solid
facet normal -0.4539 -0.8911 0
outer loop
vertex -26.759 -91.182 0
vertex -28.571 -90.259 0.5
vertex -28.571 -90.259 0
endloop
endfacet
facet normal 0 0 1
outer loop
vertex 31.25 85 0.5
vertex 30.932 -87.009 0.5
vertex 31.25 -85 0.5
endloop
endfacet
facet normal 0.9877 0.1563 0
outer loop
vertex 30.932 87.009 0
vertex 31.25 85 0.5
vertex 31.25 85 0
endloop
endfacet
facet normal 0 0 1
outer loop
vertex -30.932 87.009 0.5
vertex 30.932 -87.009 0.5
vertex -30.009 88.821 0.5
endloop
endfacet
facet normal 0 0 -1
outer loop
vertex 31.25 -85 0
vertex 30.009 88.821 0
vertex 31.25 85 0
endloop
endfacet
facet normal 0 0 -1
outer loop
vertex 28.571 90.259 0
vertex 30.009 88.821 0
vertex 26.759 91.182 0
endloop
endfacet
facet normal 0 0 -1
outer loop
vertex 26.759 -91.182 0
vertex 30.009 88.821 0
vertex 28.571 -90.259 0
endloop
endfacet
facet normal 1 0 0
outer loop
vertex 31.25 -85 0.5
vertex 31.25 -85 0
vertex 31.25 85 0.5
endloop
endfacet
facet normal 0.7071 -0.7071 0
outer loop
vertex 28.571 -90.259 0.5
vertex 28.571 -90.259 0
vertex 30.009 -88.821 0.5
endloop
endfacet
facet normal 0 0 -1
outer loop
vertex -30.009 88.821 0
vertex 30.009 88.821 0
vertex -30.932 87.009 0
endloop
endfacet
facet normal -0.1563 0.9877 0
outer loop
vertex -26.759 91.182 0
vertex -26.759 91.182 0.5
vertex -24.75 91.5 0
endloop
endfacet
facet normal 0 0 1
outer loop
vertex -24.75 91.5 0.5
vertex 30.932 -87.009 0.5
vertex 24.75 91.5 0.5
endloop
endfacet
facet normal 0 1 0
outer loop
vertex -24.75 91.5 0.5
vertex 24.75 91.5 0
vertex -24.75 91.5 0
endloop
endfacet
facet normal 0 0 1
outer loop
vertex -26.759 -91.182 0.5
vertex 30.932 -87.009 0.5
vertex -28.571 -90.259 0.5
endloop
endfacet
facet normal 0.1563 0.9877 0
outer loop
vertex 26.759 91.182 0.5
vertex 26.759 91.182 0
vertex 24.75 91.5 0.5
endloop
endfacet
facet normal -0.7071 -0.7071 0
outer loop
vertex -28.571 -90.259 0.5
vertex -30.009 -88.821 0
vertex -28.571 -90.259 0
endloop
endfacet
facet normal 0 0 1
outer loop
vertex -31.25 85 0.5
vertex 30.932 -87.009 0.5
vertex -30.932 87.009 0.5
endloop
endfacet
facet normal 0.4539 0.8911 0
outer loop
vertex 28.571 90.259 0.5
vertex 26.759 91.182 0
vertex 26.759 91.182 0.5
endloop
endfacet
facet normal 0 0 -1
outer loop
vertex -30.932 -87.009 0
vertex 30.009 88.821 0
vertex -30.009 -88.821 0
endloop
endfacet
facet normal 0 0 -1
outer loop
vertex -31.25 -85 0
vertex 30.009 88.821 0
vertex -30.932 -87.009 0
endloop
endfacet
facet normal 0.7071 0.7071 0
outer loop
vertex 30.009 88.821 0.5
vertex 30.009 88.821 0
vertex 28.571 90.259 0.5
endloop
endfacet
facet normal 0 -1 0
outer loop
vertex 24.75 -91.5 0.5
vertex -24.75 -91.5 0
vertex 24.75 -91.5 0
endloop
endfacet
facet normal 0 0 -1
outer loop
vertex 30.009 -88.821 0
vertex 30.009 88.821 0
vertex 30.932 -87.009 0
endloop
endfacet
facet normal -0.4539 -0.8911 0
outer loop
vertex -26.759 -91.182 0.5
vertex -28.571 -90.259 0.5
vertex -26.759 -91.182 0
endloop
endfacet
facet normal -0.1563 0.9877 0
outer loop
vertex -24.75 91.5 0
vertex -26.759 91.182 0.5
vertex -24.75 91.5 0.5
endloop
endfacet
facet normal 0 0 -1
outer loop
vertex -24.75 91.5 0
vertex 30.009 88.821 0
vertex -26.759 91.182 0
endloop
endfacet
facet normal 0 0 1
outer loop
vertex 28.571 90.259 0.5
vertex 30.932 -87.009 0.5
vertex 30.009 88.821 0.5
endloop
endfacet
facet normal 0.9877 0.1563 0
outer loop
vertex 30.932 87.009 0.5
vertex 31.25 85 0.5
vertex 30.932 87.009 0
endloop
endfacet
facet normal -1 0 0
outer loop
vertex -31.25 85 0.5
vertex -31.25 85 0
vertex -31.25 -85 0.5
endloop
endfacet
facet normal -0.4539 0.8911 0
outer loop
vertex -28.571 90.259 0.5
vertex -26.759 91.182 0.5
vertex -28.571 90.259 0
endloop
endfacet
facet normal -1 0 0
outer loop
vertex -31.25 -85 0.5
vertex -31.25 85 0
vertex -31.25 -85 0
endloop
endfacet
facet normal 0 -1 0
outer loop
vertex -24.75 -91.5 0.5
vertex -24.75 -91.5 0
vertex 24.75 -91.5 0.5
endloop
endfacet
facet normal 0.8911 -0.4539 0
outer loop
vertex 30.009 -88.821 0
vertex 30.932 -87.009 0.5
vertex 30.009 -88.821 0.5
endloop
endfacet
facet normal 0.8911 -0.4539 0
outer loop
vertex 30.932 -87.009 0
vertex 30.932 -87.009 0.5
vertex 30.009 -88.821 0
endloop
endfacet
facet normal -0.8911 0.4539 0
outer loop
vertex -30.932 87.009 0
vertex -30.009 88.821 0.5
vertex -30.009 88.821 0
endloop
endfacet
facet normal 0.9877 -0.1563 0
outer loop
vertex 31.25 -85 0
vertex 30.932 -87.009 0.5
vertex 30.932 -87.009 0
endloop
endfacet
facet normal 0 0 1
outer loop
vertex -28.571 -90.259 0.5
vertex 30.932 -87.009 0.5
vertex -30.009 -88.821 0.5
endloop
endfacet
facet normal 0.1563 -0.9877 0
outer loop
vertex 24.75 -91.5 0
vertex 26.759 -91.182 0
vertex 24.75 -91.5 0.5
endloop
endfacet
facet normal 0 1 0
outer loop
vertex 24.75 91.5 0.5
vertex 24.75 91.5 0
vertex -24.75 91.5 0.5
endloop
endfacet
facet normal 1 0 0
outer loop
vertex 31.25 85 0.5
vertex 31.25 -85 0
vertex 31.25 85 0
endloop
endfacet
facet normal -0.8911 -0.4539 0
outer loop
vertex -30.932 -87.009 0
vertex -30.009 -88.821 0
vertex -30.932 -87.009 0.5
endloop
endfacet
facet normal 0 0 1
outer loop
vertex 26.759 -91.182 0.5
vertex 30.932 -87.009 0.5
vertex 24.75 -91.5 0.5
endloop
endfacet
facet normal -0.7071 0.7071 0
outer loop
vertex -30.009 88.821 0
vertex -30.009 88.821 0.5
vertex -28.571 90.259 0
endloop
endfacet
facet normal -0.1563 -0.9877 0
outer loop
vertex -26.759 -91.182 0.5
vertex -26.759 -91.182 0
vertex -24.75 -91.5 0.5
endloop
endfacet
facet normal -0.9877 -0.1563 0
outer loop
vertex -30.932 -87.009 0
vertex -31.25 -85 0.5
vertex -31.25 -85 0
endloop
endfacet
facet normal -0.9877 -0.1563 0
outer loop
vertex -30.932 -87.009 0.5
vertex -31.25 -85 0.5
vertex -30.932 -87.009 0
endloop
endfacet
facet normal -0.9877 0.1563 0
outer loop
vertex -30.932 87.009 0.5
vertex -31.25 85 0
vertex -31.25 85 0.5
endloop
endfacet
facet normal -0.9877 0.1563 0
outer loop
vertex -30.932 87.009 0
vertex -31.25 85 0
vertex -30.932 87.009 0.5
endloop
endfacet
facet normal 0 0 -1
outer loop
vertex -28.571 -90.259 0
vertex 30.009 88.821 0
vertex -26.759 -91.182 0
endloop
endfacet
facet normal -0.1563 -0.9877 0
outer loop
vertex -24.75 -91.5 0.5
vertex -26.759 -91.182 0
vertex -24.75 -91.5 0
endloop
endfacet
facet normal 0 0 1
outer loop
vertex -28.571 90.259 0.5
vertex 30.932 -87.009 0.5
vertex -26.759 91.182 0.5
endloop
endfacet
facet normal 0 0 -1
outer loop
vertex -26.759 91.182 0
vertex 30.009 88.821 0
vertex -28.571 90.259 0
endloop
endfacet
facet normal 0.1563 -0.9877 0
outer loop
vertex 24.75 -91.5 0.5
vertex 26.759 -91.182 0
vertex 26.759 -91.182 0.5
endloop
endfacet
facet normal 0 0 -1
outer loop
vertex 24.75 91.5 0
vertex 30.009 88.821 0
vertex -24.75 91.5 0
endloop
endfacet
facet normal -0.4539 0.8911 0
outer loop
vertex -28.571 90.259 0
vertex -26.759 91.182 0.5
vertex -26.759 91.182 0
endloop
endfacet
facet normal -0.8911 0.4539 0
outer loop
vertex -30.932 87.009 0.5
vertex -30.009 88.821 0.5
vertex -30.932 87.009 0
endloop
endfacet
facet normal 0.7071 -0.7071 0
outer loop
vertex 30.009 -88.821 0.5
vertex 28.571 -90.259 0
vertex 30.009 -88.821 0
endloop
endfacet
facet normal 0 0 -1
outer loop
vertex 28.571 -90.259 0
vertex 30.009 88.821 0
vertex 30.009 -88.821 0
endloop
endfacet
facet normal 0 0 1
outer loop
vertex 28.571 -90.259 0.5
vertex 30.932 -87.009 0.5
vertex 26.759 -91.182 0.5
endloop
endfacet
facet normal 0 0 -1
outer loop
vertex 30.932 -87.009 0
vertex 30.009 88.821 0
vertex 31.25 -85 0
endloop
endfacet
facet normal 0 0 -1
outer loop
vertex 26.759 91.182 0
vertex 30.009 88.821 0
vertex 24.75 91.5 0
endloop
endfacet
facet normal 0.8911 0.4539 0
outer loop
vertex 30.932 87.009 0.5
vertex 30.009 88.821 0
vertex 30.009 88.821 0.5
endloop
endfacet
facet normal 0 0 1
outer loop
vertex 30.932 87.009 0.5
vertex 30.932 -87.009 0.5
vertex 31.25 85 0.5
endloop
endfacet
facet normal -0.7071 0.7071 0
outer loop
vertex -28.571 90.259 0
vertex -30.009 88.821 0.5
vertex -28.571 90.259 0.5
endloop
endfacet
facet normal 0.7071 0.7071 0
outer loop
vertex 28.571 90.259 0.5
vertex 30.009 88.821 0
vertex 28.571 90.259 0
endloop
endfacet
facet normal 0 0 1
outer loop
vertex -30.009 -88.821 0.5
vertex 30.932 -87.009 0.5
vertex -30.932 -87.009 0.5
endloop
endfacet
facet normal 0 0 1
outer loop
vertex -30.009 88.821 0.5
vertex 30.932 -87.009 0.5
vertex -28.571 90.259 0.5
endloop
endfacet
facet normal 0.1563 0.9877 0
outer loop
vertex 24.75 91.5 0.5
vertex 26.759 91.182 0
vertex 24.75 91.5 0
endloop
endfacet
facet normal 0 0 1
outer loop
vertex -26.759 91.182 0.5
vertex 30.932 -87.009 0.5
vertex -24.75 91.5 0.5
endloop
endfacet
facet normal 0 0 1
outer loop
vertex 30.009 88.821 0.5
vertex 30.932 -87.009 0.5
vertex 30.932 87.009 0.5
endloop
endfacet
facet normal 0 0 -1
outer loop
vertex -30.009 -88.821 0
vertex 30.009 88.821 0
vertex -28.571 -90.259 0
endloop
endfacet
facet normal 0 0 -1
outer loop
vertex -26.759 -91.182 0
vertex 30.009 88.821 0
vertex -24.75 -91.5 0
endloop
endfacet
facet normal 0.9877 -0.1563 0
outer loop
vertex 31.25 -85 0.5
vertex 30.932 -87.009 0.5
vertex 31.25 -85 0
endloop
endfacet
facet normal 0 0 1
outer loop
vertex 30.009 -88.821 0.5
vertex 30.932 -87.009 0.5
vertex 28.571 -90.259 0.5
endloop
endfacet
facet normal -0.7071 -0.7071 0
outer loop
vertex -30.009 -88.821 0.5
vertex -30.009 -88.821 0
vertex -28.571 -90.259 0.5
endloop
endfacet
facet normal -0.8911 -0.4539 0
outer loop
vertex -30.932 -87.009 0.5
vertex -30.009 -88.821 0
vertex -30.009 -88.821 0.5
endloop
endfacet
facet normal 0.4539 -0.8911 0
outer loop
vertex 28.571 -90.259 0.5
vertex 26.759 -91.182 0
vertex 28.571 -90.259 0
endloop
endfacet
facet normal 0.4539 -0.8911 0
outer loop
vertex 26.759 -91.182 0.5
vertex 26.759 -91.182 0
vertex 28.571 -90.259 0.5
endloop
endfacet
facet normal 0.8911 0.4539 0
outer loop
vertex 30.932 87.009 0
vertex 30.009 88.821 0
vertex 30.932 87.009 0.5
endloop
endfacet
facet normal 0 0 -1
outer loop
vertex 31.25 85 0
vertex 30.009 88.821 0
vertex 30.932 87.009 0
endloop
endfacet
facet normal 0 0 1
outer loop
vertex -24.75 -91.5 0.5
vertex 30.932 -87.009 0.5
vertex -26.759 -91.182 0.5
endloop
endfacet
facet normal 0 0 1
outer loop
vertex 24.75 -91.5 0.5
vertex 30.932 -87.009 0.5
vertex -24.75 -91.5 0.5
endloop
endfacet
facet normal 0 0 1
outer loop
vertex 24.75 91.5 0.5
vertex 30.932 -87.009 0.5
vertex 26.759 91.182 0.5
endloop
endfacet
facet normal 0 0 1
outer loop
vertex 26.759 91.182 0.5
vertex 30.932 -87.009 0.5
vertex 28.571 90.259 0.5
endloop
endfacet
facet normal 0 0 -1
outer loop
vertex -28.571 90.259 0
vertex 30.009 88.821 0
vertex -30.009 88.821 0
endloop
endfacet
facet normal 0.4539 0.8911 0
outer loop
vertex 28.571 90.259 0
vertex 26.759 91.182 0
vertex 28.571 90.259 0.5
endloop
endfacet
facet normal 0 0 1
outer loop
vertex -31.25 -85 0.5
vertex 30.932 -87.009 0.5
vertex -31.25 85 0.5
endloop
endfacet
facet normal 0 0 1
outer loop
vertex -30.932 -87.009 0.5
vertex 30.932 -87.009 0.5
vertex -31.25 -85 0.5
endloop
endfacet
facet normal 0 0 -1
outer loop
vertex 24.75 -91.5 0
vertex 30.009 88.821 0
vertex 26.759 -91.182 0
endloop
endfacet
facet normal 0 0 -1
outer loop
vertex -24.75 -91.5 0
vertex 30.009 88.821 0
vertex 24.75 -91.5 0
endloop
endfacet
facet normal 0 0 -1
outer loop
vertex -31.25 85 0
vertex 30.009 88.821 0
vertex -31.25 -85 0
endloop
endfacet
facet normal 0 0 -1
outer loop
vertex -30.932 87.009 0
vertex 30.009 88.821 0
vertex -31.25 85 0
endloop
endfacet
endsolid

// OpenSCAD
width = 62.5;
length = 183;
corner_dia = 13;

thickness = 0.5;


$fn = 20;

module rounded_rect(w, l, h, d) {
  hull() {
    for(i = [-1, 1]) {
     for(j = [-1, 1]) {
       translate([i*(w-d)/2, j*(l-d)/2, 0])
       cylinder(d = d, h = h);
     }
    }
  }
}

rounded_rect(width, length, thickness, corner_dia);
